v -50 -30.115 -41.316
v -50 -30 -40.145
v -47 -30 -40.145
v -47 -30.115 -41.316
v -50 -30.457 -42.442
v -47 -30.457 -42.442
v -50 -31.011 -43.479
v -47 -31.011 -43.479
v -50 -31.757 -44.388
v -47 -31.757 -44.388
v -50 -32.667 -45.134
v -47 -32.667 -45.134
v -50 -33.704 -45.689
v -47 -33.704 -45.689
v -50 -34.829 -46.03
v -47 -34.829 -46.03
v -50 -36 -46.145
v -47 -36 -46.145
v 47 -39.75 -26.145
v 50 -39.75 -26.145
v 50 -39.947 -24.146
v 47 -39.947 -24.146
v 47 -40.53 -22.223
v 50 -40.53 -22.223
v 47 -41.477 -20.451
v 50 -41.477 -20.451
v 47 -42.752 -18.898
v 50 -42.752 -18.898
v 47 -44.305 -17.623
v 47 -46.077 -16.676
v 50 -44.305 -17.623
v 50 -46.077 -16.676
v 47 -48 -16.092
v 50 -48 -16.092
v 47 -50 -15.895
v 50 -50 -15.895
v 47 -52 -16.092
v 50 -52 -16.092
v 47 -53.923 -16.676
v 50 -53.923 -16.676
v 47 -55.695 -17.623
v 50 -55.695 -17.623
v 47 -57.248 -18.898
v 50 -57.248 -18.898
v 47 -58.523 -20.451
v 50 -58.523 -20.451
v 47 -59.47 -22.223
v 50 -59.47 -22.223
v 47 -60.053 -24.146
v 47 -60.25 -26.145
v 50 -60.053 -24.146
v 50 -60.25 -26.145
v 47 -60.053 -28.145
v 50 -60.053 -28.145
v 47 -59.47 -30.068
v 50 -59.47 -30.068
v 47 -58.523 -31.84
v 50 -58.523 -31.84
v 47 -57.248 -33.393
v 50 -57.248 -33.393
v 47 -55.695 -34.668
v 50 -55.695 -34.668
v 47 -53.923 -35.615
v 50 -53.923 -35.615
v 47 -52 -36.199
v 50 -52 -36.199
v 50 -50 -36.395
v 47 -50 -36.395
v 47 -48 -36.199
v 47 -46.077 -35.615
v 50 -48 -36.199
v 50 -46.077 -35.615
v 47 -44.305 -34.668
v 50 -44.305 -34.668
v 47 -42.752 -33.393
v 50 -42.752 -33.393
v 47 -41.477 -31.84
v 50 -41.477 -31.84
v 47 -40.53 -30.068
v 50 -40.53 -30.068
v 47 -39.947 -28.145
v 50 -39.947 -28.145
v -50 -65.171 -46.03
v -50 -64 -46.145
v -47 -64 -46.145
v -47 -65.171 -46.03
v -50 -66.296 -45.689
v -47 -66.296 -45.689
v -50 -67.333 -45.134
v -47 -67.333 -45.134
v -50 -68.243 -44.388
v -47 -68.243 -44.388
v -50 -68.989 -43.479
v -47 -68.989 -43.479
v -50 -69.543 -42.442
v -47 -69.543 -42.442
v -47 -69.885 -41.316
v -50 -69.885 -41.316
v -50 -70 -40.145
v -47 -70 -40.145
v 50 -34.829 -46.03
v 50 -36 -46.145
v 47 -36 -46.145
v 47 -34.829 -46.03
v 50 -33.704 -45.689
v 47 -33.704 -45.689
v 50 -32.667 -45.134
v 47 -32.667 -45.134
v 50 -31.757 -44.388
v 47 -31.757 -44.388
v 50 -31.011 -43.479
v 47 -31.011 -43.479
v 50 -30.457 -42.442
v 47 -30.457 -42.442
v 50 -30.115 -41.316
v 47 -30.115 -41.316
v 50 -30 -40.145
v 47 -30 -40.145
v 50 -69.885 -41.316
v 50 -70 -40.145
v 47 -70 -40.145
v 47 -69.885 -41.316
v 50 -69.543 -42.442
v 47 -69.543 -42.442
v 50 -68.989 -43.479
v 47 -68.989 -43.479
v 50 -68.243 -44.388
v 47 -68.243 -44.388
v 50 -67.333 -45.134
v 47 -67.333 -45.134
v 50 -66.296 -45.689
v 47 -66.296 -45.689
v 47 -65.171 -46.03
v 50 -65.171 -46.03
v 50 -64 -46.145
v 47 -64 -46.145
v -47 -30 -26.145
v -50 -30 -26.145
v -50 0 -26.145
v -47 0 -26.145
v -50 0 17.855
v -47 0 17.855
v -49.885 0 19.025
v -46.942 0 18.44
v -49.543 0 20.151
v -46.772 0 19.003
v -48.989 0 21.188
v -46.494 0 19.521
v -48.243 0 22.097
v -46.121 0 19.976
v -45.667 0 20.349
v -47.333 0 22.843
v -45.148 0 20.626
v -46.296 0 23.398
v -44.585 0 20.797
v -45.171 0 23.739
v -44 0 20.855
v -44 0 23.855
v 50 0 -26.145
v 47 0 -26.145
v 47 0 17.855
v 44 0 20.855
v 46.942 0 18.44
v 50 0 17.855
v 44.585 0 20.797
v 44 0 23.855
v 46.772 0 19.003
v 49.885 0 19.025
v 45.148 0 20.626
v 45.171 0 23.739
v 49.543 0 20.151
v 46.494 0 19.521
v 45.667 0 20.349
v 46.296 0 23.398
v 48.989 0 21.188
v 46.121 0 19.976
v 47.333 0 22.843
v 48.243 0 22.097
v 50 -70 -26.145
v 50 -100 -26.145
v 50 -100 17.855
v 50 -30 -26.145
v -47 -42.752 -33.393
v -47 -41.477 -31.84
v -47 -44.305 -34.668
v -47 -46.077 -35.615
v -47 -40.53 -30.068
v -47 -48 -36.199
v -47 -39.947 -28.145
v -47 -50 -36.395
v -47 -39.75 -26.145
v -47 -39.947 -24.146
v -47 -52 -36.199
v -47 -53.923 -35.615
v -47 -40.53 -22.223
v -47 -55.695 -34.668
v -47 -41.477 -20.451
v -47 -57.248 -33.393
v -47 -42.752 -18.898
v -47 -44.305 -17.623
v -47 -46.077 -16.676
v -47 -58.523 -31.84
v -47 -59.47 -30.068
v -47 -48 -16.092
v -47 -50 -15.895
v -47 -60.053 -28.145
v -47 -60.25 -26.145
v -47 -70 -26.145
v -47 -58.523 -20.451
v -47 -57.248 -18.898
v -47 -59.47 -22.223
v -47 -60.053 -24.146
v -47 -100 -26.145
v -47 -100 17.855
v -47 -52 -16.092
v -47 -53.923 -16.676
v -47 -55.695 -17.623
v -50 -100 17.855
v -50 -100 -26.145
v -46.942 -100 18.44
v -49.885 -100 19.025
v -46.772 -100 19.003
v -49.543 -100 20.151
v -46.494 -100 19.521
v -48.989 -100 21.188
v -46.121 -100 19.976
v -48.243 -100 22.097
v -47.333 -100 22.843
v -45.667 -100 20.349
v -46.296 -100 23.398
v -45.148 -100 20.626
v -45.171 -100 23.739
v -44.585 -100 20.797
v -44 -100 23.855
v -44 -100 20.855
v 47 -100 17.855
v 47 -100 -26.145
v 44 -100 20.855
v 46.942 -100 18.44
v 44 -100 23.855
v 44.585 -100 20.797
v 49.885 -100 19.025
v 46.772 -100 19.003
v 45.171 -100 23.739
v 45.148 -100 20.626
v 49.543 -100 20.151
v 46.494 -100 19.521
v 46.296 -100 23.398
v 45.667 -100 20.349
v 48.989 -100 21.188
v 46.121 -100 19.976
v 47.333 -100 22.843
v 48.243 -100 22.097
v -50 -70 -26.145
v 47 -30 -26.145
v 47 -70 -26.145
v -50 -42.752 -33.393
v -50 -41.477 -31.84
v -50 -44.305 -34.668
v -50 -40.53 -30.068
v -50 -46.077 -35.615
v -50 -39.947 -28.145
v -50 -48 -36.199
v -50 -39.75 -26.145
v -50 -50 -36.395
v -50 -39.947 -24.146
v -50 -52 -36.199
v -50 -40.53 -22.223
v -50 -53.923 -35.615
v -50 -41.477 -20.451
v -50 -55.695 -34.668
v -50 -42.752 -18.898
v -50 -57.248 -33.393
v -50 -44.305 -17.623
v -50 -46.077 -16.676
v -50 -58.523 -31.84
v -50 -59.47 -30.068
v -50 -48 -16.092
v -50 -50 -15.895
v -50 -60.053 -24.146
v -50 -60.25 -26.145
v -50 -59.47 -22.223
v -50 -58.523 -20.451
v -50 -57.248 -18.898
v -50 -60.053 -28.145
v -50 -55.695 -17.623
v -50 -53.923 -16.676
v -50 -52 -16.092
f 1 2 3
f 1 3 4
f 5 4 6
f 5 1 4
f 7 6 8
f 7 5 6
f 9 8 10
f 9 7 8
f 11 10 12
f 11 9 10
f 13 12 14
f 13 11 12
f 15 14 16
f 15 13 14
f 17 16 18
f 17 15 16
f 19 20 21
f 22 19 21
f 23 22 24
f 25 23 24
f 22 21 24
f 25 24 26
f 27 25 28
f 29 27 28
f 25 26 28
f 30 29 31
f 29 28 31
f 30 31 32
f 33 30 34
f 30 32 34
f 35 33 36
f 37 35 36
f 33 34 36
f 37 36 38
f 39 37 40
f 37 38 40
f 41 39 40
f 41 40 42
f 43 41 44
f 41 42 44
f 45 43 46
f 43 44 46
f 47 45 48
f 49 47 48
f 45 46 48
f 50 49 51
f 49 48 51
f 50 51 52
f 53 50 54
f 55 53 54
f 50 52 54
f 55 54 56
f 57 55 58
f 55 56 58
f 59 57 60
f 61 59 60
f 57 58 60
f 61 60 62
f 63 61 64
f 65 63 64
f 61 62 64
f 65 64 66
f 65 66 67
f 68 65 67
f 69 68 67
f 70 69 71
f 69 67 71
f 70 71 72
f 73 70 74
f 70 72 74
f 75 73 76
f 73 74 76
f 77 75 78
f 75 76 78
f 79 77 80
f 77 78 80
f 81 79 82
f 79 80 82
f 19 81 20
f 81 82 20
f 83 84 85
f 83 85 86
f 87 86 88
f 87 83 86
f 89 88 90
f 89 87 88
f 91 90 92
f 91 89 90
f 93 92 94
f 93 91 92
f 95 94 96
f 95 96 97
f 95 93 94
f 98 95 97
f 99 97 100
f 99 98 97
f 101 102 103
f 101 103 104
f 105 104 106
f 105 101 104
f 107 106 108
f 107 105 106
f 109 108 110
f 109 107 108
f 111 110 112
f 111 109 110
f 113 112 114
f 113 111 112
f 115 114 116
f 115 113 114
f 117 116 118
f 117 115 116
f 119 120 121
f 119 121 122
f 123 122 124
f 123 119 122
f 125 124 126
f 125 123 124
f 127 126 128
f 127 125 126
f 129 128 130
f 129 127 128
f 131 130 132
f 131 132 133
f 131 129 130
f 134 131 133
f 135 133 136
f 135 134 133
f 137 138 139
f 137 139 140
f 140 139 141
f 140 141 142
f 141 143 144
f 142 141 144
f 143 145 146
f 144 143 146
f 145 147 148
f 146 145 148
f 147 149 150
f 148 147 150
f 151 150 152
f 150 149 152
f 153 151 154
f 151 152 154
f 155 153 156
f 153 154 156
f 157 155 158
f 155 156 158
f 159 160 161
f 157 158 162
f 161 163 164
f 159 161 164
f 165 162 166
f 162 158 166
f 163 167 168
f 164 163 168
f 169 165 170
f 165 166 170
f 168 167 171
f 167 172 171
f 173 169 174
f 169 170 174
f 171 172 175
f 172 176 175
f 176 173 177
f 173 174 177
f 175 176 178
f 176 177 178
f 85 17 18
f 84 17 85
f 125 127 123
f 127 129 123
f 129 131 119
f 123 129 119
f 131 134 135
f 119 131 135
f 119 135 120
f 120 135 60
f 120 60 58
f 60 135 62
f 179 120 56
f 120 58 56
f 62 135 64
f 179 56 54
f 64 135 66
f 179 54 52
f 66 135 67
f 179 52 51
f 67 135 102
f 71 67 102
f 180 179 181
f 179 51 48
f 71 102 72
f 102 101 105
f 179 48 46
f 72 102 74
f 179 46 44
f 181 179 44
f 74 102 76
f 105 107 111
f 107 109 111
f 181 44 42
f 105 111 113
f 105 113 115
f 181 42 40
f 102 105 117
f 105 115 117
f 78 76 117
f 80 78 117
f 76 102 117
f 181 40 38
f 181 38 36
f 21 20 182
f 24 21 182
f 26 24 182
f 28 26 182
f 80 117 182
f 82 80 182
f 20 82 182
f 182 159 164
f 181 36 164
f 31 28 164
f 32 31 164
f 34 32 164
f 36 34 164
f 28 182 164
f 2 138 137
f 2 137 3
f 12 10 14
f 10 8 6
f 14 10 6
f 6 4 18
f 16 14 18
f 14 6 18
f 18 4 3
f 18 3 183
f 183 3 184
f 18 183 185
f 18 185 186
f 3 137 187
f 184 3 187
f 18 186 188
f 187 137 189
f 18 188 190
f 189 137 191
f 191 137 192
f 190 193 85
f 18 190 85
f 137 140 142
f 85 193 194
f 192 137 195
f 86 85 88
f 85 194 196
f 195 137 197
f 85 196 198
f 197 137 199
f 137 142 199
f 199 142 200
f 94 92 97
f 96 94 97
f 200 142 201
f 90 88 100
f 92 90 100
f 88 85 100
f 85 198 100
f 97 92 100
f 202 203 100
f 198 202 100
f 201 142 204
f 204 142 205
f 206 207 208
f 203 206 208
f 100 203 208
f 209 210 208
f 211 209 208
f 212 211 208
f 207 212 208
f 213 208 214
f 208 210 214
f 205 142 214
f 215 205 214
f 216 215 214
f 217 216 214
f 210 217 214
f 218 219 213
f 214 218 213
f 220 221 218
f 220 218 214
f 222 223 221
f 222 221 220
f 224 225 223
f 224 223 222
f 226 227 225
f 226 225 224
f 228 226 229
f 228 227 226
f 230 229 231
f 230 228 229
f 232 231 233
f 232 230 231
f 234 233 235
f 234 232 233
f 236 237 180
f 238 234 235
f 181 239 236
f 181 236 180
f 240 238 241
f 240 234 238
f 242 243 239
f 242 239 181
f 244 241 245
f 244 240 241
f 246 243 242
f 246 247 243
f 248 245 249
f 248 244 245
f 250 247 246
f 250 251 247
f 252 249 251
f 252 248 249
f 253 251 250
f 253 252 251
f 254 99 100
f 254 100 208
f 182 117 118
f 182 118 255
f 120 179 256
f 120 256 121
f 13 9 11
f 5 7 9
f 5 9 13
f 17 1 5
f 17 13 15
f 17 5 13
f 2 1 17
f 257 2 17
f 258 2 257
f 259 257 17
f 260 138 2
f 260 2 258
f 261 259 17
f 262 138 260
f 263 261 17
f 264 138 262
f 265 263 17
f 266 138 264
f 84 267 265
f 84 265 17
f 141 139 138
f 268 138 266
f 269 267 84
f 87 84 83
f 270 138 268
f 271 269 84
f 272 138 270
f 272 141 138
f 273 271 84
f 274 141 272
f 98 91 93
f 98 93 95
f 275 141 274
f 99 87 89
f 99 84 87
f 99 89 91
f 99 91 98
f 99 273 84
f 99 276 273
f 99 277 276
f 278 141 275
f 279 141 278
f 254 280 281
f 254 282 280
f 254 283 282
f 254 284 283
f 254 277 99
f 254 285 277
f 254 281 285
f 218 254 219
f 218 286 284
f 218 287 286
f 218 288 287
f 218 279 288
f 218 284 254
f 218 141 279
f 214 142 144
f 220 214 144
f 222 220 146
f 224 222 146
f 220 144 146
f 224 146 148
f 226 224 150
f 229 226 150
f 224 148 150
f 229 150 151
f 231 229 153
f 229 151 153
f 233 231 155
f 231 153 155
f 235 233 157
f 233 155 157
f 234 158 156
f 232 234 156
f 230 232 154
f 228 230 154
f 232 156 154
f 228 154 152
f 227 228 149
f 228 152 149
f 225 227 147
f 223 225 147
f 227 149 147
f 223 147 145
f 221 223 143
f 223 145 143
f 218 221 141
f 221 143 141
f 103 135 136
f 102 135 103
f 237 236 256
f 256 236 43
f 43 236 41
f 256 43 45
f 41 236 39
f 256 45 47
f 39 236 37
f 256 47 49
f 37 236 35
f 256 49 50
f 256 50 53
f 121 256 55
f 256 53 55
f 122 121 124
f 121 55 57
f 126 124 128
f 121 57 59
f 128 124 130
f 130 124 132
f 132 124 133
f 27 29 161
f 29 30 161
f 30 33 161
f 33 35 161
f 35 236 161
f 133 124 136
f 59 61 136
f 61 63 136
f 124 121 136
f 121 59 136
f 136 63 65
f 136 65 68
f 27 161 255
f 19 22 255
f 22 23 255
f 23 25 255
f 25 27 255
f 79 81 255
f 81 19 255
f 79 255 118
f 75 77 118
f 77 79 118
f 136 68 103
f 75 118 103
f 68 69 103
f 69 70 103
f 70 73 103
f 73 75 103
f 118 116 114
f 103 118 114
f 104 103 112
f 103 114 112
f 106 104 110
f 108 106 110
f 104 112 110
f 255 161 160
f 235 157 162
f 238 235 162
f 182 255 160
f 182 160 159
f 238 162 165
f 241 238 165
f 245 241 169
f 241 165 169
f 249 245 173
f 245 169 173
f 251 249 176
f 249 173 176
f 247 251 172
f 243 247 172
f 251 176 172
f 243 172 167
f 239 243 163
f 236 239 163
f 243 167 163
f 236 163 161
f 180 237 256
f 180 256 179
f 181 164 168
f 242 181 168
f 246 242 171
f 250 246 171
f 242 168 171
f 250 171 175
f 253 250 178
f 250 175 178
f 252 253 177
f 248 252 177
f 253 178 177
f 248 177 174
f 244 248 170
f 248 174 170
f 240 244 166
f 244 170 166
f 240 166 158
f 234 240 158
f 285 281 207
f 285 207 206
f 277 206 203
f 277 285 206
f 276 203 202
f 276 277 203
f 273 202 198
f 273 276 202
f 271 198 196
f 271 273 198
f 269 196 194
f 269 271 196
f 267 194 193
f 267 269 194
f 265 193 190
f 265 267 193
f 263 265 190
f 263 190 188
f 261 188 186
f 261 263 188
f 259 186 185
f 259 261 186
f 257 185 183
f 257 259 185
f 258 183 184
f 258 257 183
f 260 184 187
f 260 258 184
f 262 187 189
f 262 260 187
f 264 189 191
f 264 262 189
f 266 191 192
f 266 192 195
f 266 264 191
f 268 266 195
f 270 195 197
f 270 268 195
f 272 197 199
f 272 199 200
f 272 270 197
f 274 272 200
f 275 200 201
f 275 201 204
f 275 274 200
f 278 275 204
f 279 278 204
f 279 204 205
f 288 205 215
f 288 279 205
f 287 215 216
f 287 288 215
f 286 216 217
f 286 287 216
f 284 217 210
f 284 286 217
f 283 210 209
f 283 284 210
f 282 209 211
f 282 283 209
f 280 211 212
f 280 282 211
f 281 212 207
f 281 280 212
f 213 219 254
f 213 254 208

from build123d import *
from build123d import SkipClean  # not in build123d's __all__

# Parameters (mm, degrees)
F1_DEPTH = 100
F3_DEPTH = 3
F4_DEPTH = 3
F6_DEPTH = 3
F7_R     = 10.25
F8_DEPTH = 3


# Not quite as in the source:
# - a feature names something its author has since deleted; it is built from what else it names


with BuildPart() as f1:
    # F0 (on Front) → F1 (new body)
    with BuildSketch(Plane.XZ):
        with BuildLine():
            Line((-44, 20.8545142158), (0, 20.8545142158))
            Line((0, 20.8545142158), (0, 23.8545142158))
            Line((0, 23.8545142158), (-44, 23.8545142158))
            ThreePointArc((-44, 23.8545142158), (-48.2426406871, 22.0971549029), (-50, 17.8545142158))
            Line((-50, 17.8545142158), (-50, -26.1454857842))
            Line((-50, -26.1454857842), (-47, -26.1454857842))
            Line((-47, -26.1454857842), (-47, 17.8545142158))
            ThreePointArc((-47, 17.8545142158), (-46.1213203436, 19.9758345594), (-44, 20.8545142158))
        make_face()
        with BuildLine():
            Line((0, 23.8545142158), (0, 20.8545142158))
            Line((0, 20.8545142158), (44, 20.8545142158))
            ThreePointArc((44, 20.8545142158), (46.1213203436, 19.9758345594), (47, 17.8545142158))
            Line((47, 17.8545142158), (47, -26.1454857842))
            Line((47, -26.1454857842), (50, -26.1454857842))
            Line((50, -26.1454857842), (50, 17.8545142158))
            ThreePointArc((50, 17.8545142158), (48.2426406871, 22.0971549029), (44, 23.8545142158))
            Line((44, 23.8545142158), (0, 23.8545142158))
        make_face()
    extrude(amount=F1_DEPTH)

    # F2 (on face) → F3 (cut)
    with BuildSketch(Plane(origin=(-50, 0, 0), x_dir=(0, -1, 0), z_dir=(-1, 0, 0))):
        with BuildLine():
            Line((39.75, -26.1454857842), (60.25, -26.1454857842))
            ThreePointArc((60.25, -26.1454857842), (50, -15.8954857842), (39.75, -26.1454857842))
        make_face()
    extrude(amount=-F3_DEPTH, mode=Mode.SUBTRACT)

    # F2 (on face) → F4 (join)
    with BuildSketch(Plane(origin=(-50, 0, 0), x_dir=(0, -1, 0), z_dir=(-1, 0, 0))):
        with BuildLine():
            Line((70, -26.1454857842), (60.25, -26.1454857842))
            ThreePointArc((60.25, -26.1454857842), (50, -36.3954857842), (39.75, -26.1454857842))
            Line((39.75, -26.1454857842), (30, -26.1454857842))
            Line((30, -26.1454857842), (30, -40.1454857842))
            ThreePointArc((30, -40.1454857842), (31.7573593129, -44.3881264713), (36, -46.1454857842))
            Line((36, -46.1454857842), (64, -46.1454857842))
            ThreePointArc((64, -46.1454857842), (68.2426406871, -44.3881264713), (70, -40.1454857842))
            Line((70, -40.1454857842), (70, -26.1454857842))
        make_face()
    with SkipClean():  # cleaning this boolean's faces spoils the solid; the shape is the same uncleaned
        extrude(amount=-F4_DEPTH)

    # F5 (on face) → F6 (join)
    with BuildSketch(Plane.YZ.offset(50)):
        with BuildLine():
            Line((-30, -26.1454857842), (-70, -26.1454857842))
            Line((-70, -26.1454857842), (-70, -40.1454857842))
            ThreePointArc((-70, -40.1454857842), (-68.2426406871, -44.3881264713), (-64, -46.1454857842))
            Line((-64, -46.1454857842), (-36, -46.1454857842))
            ThreePointArc((-36, -46.1454857842), (-31.7573593129, -44.3881264713), (-30, -40.1454857842))
            Line((-30, -40.1454857842), (-30, -26.1454857842))
        make_face()
    extrude(amount=-F6_DEPTH)

    # F7 (on face) → F8 (cut)
    with BuildSketch(Plane.YZ.offset(50)):
        with Locations((-50, -26.1454857842)):
            Circle(F7_R)
    extrude(amount=-F8_DEPTH, mode=Mode.SUBTRACT)


solid = f1.part
